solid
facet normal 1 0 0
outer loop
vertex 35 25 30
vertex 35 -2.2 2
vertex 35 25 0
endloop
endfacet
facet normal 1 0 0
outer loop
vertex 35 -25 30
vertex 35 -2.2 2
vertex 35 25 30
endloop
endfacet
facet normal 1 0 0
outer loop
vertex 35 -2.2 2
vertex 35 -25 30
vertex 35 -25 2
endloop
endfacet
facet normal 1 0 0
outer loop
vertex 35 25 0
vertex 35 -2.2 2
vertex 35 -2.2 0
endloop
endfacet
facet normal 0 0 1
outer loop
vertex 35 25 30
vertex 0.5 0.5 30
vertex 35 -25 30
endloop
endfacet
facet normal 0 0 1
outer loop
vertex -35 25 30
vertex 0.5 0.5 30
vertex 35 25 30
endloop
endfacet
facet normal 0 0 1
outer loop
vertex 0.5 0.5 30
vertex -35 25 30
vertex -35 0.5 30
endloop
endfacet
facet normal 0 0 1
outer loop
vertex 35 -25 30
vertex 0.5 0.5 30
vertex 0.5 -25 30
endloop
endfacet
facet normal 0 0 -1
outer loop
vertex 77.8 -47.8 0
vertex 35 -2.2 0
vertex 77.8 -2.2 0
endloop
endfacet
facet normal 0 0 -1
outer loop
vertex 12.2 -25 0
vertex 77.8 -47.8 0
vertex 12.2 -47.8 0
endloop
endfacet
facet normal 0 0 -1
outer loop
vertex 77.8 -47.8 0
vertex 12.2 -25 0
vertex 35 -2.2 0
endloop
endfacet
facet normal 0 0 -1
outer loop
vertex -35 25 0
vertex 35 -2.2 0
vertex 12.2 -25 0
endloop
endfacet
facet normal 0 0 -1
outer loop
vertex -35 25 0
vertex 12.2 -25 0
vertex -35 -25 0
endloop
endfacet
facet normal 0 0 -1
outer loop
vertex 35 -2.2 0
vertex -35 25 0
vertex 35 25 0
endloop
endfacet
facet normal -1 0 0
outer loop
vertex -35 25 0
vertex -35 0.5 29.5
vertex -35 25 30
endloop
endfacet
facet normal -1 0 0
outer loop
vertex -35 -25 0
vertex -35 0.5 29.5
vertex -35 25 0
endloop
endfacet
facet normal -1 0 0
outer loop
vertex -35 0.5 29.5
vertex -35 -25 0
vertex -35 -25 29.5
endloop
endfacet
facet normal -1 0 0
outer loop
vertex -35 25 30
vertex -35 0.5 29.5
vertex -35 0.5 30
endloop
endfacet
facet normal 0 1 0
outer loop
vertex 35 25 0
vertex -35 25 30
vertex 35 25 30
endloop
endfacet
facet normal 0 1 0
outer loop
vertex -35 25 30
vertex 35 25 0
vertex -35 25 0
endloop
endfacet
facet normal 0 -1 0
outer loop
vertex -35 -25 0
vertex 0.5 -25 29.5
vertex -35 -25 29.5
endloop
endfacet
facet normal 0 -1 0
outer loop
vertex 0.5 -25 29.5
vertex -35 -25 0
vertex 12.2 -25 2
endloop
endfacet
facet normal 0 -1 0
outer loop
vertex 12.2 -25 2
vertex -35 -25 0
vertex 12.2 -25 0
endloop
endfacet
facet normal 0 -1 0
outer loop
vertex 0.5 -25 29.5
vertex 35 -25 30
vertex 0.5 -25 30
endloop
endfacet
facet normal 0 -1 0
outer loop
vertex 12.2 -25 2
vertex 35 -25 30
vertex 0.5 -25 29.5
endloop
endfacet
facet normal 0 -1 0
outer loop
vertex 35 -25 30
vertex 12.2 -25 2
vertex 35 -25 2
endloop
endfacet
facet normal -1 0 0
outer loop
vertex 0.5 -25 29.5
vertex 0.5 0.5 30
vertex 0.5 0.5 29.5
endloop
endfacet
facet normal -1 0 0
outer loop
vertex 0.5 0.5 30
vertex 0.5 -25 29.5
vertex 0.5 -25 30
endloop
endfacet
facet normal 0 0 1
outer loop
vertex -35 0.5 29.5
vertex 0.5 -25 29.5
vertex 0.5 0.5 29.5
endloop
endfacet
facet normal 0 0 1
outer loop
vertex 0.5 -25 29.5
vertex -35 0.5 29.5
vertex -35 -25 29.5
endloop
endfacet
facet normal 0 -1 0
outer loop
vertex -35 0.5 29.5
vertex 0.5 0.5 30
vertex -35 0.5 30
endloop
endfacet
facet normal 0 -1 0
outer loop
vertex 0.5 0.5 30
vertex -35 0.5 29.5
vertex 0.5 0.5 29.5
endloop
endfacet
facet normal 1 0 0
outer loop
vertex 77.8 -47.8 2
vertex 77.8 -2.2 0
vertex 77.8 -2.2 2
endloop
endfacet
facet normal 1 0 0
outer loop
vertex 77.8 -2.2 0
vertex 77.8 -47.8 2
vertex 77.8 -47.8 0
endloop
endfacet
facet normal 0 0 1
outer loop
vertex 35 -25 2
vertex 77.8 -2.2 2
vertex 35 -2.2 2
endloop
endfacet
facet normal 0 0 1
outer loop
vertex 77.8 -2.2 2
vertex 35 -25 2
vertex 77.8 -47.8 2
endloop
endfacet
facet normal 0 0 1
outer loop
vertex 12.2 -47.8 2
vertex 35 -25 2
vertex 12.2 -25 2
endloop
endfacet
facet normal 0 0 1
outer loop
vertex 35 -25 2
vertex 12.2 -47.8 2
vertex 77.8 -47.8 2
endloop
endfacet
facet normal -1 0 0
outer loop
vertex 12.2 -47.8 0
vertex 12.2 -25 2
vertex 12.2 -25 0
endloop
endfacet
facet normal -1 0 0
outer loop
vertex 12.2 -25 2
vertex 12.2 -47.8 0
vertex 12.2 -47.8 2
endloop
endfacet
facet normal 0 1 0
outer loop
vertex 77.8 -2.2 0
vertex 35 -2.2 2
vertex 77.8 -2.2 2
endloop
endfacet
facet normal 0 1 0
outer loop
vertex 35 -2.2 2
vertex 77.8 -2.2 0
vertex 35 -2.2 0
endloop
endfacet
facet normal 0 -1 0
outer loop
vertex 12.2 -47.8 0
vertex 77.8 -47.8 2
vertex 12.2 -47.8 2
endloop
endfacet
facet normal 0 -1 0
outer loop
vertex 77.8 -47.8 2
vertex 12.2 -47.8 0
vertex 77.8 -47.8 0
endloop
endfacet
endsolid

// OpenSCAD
// Two-part enclosure for a small electronics board (e.g. Arduino-based temperature logger)
// Print orientation: box stands on the bed, lid lies flat on the bed upside down.
// The two parts are placed side by side with a 10 mm gap so they print together.

$fn = 64;

// ---------------- Dimensions (mm) ----------------
box_x      = 70;    // box outer length (X)
box_y      = 50;    // box outer width (Y)
box_z      = 30;    // box outer height (Z)
wall       = 2;     // box wall thickness
floor      = 2;     // box floor thickness (separate from walls for clarity)

lip_t      = 1.5;   // lid wall thickness
lip_h      = 4;     // lid wall height (sticks up above the plate)
lip_x      = 65.6;  // lid wall outer length (X)
lip_y      = 45.6;  // lid wall outer width (Y)
clearance  = 0.2;   // gap between lid wall and box opening on each side

plate_t    = 2;     // lid plate thickness (sits on the bed)
gap        = 10;    // gap between box and lid on the bed

eps        = 0.5;   // overshoot for clean boolean cuts

// ---------------- Model ----------------
union() {
    // Part 1: Box (open top)
    translate([-box_x/2, -box_y/2, 0])
        difference() {
            cube([box_x, box_y, box_z]);
            // open the top: cut from above the top face down by eps
            translate([-box_x/2 - eps, -box_y/2 - eps, box_z - eps])
                cube([box_x + 2*eps, box_y + 2*eps, eps]);
        }

    // Part 2: Lid (printed upside down)
    translate([box_x/2 + gap, -box_y/2, 0])
        difference() {
            // base plate lying on the bed
            translate([-lip_x/2, -lip_y/2, 0])
                cube([lip_x, lip_y, plate_t]);
            // rectangular lip on top of the plate, centred on it
            translate([-lip_x/2, -lip_y/2, plate_t])
                cube([lip_x, lip_y, lip_h]);
            // pocket the lid slides into: 0.2 mm clearance on each side
            translate([-box_x/2 + clearance, -box_y/2 + clearance, plate_t + lip_h - eps])
                cube([box_x - 2*clearance, box_y - 2*clearance, eps + lip_h - plate_t]);
        }
}
